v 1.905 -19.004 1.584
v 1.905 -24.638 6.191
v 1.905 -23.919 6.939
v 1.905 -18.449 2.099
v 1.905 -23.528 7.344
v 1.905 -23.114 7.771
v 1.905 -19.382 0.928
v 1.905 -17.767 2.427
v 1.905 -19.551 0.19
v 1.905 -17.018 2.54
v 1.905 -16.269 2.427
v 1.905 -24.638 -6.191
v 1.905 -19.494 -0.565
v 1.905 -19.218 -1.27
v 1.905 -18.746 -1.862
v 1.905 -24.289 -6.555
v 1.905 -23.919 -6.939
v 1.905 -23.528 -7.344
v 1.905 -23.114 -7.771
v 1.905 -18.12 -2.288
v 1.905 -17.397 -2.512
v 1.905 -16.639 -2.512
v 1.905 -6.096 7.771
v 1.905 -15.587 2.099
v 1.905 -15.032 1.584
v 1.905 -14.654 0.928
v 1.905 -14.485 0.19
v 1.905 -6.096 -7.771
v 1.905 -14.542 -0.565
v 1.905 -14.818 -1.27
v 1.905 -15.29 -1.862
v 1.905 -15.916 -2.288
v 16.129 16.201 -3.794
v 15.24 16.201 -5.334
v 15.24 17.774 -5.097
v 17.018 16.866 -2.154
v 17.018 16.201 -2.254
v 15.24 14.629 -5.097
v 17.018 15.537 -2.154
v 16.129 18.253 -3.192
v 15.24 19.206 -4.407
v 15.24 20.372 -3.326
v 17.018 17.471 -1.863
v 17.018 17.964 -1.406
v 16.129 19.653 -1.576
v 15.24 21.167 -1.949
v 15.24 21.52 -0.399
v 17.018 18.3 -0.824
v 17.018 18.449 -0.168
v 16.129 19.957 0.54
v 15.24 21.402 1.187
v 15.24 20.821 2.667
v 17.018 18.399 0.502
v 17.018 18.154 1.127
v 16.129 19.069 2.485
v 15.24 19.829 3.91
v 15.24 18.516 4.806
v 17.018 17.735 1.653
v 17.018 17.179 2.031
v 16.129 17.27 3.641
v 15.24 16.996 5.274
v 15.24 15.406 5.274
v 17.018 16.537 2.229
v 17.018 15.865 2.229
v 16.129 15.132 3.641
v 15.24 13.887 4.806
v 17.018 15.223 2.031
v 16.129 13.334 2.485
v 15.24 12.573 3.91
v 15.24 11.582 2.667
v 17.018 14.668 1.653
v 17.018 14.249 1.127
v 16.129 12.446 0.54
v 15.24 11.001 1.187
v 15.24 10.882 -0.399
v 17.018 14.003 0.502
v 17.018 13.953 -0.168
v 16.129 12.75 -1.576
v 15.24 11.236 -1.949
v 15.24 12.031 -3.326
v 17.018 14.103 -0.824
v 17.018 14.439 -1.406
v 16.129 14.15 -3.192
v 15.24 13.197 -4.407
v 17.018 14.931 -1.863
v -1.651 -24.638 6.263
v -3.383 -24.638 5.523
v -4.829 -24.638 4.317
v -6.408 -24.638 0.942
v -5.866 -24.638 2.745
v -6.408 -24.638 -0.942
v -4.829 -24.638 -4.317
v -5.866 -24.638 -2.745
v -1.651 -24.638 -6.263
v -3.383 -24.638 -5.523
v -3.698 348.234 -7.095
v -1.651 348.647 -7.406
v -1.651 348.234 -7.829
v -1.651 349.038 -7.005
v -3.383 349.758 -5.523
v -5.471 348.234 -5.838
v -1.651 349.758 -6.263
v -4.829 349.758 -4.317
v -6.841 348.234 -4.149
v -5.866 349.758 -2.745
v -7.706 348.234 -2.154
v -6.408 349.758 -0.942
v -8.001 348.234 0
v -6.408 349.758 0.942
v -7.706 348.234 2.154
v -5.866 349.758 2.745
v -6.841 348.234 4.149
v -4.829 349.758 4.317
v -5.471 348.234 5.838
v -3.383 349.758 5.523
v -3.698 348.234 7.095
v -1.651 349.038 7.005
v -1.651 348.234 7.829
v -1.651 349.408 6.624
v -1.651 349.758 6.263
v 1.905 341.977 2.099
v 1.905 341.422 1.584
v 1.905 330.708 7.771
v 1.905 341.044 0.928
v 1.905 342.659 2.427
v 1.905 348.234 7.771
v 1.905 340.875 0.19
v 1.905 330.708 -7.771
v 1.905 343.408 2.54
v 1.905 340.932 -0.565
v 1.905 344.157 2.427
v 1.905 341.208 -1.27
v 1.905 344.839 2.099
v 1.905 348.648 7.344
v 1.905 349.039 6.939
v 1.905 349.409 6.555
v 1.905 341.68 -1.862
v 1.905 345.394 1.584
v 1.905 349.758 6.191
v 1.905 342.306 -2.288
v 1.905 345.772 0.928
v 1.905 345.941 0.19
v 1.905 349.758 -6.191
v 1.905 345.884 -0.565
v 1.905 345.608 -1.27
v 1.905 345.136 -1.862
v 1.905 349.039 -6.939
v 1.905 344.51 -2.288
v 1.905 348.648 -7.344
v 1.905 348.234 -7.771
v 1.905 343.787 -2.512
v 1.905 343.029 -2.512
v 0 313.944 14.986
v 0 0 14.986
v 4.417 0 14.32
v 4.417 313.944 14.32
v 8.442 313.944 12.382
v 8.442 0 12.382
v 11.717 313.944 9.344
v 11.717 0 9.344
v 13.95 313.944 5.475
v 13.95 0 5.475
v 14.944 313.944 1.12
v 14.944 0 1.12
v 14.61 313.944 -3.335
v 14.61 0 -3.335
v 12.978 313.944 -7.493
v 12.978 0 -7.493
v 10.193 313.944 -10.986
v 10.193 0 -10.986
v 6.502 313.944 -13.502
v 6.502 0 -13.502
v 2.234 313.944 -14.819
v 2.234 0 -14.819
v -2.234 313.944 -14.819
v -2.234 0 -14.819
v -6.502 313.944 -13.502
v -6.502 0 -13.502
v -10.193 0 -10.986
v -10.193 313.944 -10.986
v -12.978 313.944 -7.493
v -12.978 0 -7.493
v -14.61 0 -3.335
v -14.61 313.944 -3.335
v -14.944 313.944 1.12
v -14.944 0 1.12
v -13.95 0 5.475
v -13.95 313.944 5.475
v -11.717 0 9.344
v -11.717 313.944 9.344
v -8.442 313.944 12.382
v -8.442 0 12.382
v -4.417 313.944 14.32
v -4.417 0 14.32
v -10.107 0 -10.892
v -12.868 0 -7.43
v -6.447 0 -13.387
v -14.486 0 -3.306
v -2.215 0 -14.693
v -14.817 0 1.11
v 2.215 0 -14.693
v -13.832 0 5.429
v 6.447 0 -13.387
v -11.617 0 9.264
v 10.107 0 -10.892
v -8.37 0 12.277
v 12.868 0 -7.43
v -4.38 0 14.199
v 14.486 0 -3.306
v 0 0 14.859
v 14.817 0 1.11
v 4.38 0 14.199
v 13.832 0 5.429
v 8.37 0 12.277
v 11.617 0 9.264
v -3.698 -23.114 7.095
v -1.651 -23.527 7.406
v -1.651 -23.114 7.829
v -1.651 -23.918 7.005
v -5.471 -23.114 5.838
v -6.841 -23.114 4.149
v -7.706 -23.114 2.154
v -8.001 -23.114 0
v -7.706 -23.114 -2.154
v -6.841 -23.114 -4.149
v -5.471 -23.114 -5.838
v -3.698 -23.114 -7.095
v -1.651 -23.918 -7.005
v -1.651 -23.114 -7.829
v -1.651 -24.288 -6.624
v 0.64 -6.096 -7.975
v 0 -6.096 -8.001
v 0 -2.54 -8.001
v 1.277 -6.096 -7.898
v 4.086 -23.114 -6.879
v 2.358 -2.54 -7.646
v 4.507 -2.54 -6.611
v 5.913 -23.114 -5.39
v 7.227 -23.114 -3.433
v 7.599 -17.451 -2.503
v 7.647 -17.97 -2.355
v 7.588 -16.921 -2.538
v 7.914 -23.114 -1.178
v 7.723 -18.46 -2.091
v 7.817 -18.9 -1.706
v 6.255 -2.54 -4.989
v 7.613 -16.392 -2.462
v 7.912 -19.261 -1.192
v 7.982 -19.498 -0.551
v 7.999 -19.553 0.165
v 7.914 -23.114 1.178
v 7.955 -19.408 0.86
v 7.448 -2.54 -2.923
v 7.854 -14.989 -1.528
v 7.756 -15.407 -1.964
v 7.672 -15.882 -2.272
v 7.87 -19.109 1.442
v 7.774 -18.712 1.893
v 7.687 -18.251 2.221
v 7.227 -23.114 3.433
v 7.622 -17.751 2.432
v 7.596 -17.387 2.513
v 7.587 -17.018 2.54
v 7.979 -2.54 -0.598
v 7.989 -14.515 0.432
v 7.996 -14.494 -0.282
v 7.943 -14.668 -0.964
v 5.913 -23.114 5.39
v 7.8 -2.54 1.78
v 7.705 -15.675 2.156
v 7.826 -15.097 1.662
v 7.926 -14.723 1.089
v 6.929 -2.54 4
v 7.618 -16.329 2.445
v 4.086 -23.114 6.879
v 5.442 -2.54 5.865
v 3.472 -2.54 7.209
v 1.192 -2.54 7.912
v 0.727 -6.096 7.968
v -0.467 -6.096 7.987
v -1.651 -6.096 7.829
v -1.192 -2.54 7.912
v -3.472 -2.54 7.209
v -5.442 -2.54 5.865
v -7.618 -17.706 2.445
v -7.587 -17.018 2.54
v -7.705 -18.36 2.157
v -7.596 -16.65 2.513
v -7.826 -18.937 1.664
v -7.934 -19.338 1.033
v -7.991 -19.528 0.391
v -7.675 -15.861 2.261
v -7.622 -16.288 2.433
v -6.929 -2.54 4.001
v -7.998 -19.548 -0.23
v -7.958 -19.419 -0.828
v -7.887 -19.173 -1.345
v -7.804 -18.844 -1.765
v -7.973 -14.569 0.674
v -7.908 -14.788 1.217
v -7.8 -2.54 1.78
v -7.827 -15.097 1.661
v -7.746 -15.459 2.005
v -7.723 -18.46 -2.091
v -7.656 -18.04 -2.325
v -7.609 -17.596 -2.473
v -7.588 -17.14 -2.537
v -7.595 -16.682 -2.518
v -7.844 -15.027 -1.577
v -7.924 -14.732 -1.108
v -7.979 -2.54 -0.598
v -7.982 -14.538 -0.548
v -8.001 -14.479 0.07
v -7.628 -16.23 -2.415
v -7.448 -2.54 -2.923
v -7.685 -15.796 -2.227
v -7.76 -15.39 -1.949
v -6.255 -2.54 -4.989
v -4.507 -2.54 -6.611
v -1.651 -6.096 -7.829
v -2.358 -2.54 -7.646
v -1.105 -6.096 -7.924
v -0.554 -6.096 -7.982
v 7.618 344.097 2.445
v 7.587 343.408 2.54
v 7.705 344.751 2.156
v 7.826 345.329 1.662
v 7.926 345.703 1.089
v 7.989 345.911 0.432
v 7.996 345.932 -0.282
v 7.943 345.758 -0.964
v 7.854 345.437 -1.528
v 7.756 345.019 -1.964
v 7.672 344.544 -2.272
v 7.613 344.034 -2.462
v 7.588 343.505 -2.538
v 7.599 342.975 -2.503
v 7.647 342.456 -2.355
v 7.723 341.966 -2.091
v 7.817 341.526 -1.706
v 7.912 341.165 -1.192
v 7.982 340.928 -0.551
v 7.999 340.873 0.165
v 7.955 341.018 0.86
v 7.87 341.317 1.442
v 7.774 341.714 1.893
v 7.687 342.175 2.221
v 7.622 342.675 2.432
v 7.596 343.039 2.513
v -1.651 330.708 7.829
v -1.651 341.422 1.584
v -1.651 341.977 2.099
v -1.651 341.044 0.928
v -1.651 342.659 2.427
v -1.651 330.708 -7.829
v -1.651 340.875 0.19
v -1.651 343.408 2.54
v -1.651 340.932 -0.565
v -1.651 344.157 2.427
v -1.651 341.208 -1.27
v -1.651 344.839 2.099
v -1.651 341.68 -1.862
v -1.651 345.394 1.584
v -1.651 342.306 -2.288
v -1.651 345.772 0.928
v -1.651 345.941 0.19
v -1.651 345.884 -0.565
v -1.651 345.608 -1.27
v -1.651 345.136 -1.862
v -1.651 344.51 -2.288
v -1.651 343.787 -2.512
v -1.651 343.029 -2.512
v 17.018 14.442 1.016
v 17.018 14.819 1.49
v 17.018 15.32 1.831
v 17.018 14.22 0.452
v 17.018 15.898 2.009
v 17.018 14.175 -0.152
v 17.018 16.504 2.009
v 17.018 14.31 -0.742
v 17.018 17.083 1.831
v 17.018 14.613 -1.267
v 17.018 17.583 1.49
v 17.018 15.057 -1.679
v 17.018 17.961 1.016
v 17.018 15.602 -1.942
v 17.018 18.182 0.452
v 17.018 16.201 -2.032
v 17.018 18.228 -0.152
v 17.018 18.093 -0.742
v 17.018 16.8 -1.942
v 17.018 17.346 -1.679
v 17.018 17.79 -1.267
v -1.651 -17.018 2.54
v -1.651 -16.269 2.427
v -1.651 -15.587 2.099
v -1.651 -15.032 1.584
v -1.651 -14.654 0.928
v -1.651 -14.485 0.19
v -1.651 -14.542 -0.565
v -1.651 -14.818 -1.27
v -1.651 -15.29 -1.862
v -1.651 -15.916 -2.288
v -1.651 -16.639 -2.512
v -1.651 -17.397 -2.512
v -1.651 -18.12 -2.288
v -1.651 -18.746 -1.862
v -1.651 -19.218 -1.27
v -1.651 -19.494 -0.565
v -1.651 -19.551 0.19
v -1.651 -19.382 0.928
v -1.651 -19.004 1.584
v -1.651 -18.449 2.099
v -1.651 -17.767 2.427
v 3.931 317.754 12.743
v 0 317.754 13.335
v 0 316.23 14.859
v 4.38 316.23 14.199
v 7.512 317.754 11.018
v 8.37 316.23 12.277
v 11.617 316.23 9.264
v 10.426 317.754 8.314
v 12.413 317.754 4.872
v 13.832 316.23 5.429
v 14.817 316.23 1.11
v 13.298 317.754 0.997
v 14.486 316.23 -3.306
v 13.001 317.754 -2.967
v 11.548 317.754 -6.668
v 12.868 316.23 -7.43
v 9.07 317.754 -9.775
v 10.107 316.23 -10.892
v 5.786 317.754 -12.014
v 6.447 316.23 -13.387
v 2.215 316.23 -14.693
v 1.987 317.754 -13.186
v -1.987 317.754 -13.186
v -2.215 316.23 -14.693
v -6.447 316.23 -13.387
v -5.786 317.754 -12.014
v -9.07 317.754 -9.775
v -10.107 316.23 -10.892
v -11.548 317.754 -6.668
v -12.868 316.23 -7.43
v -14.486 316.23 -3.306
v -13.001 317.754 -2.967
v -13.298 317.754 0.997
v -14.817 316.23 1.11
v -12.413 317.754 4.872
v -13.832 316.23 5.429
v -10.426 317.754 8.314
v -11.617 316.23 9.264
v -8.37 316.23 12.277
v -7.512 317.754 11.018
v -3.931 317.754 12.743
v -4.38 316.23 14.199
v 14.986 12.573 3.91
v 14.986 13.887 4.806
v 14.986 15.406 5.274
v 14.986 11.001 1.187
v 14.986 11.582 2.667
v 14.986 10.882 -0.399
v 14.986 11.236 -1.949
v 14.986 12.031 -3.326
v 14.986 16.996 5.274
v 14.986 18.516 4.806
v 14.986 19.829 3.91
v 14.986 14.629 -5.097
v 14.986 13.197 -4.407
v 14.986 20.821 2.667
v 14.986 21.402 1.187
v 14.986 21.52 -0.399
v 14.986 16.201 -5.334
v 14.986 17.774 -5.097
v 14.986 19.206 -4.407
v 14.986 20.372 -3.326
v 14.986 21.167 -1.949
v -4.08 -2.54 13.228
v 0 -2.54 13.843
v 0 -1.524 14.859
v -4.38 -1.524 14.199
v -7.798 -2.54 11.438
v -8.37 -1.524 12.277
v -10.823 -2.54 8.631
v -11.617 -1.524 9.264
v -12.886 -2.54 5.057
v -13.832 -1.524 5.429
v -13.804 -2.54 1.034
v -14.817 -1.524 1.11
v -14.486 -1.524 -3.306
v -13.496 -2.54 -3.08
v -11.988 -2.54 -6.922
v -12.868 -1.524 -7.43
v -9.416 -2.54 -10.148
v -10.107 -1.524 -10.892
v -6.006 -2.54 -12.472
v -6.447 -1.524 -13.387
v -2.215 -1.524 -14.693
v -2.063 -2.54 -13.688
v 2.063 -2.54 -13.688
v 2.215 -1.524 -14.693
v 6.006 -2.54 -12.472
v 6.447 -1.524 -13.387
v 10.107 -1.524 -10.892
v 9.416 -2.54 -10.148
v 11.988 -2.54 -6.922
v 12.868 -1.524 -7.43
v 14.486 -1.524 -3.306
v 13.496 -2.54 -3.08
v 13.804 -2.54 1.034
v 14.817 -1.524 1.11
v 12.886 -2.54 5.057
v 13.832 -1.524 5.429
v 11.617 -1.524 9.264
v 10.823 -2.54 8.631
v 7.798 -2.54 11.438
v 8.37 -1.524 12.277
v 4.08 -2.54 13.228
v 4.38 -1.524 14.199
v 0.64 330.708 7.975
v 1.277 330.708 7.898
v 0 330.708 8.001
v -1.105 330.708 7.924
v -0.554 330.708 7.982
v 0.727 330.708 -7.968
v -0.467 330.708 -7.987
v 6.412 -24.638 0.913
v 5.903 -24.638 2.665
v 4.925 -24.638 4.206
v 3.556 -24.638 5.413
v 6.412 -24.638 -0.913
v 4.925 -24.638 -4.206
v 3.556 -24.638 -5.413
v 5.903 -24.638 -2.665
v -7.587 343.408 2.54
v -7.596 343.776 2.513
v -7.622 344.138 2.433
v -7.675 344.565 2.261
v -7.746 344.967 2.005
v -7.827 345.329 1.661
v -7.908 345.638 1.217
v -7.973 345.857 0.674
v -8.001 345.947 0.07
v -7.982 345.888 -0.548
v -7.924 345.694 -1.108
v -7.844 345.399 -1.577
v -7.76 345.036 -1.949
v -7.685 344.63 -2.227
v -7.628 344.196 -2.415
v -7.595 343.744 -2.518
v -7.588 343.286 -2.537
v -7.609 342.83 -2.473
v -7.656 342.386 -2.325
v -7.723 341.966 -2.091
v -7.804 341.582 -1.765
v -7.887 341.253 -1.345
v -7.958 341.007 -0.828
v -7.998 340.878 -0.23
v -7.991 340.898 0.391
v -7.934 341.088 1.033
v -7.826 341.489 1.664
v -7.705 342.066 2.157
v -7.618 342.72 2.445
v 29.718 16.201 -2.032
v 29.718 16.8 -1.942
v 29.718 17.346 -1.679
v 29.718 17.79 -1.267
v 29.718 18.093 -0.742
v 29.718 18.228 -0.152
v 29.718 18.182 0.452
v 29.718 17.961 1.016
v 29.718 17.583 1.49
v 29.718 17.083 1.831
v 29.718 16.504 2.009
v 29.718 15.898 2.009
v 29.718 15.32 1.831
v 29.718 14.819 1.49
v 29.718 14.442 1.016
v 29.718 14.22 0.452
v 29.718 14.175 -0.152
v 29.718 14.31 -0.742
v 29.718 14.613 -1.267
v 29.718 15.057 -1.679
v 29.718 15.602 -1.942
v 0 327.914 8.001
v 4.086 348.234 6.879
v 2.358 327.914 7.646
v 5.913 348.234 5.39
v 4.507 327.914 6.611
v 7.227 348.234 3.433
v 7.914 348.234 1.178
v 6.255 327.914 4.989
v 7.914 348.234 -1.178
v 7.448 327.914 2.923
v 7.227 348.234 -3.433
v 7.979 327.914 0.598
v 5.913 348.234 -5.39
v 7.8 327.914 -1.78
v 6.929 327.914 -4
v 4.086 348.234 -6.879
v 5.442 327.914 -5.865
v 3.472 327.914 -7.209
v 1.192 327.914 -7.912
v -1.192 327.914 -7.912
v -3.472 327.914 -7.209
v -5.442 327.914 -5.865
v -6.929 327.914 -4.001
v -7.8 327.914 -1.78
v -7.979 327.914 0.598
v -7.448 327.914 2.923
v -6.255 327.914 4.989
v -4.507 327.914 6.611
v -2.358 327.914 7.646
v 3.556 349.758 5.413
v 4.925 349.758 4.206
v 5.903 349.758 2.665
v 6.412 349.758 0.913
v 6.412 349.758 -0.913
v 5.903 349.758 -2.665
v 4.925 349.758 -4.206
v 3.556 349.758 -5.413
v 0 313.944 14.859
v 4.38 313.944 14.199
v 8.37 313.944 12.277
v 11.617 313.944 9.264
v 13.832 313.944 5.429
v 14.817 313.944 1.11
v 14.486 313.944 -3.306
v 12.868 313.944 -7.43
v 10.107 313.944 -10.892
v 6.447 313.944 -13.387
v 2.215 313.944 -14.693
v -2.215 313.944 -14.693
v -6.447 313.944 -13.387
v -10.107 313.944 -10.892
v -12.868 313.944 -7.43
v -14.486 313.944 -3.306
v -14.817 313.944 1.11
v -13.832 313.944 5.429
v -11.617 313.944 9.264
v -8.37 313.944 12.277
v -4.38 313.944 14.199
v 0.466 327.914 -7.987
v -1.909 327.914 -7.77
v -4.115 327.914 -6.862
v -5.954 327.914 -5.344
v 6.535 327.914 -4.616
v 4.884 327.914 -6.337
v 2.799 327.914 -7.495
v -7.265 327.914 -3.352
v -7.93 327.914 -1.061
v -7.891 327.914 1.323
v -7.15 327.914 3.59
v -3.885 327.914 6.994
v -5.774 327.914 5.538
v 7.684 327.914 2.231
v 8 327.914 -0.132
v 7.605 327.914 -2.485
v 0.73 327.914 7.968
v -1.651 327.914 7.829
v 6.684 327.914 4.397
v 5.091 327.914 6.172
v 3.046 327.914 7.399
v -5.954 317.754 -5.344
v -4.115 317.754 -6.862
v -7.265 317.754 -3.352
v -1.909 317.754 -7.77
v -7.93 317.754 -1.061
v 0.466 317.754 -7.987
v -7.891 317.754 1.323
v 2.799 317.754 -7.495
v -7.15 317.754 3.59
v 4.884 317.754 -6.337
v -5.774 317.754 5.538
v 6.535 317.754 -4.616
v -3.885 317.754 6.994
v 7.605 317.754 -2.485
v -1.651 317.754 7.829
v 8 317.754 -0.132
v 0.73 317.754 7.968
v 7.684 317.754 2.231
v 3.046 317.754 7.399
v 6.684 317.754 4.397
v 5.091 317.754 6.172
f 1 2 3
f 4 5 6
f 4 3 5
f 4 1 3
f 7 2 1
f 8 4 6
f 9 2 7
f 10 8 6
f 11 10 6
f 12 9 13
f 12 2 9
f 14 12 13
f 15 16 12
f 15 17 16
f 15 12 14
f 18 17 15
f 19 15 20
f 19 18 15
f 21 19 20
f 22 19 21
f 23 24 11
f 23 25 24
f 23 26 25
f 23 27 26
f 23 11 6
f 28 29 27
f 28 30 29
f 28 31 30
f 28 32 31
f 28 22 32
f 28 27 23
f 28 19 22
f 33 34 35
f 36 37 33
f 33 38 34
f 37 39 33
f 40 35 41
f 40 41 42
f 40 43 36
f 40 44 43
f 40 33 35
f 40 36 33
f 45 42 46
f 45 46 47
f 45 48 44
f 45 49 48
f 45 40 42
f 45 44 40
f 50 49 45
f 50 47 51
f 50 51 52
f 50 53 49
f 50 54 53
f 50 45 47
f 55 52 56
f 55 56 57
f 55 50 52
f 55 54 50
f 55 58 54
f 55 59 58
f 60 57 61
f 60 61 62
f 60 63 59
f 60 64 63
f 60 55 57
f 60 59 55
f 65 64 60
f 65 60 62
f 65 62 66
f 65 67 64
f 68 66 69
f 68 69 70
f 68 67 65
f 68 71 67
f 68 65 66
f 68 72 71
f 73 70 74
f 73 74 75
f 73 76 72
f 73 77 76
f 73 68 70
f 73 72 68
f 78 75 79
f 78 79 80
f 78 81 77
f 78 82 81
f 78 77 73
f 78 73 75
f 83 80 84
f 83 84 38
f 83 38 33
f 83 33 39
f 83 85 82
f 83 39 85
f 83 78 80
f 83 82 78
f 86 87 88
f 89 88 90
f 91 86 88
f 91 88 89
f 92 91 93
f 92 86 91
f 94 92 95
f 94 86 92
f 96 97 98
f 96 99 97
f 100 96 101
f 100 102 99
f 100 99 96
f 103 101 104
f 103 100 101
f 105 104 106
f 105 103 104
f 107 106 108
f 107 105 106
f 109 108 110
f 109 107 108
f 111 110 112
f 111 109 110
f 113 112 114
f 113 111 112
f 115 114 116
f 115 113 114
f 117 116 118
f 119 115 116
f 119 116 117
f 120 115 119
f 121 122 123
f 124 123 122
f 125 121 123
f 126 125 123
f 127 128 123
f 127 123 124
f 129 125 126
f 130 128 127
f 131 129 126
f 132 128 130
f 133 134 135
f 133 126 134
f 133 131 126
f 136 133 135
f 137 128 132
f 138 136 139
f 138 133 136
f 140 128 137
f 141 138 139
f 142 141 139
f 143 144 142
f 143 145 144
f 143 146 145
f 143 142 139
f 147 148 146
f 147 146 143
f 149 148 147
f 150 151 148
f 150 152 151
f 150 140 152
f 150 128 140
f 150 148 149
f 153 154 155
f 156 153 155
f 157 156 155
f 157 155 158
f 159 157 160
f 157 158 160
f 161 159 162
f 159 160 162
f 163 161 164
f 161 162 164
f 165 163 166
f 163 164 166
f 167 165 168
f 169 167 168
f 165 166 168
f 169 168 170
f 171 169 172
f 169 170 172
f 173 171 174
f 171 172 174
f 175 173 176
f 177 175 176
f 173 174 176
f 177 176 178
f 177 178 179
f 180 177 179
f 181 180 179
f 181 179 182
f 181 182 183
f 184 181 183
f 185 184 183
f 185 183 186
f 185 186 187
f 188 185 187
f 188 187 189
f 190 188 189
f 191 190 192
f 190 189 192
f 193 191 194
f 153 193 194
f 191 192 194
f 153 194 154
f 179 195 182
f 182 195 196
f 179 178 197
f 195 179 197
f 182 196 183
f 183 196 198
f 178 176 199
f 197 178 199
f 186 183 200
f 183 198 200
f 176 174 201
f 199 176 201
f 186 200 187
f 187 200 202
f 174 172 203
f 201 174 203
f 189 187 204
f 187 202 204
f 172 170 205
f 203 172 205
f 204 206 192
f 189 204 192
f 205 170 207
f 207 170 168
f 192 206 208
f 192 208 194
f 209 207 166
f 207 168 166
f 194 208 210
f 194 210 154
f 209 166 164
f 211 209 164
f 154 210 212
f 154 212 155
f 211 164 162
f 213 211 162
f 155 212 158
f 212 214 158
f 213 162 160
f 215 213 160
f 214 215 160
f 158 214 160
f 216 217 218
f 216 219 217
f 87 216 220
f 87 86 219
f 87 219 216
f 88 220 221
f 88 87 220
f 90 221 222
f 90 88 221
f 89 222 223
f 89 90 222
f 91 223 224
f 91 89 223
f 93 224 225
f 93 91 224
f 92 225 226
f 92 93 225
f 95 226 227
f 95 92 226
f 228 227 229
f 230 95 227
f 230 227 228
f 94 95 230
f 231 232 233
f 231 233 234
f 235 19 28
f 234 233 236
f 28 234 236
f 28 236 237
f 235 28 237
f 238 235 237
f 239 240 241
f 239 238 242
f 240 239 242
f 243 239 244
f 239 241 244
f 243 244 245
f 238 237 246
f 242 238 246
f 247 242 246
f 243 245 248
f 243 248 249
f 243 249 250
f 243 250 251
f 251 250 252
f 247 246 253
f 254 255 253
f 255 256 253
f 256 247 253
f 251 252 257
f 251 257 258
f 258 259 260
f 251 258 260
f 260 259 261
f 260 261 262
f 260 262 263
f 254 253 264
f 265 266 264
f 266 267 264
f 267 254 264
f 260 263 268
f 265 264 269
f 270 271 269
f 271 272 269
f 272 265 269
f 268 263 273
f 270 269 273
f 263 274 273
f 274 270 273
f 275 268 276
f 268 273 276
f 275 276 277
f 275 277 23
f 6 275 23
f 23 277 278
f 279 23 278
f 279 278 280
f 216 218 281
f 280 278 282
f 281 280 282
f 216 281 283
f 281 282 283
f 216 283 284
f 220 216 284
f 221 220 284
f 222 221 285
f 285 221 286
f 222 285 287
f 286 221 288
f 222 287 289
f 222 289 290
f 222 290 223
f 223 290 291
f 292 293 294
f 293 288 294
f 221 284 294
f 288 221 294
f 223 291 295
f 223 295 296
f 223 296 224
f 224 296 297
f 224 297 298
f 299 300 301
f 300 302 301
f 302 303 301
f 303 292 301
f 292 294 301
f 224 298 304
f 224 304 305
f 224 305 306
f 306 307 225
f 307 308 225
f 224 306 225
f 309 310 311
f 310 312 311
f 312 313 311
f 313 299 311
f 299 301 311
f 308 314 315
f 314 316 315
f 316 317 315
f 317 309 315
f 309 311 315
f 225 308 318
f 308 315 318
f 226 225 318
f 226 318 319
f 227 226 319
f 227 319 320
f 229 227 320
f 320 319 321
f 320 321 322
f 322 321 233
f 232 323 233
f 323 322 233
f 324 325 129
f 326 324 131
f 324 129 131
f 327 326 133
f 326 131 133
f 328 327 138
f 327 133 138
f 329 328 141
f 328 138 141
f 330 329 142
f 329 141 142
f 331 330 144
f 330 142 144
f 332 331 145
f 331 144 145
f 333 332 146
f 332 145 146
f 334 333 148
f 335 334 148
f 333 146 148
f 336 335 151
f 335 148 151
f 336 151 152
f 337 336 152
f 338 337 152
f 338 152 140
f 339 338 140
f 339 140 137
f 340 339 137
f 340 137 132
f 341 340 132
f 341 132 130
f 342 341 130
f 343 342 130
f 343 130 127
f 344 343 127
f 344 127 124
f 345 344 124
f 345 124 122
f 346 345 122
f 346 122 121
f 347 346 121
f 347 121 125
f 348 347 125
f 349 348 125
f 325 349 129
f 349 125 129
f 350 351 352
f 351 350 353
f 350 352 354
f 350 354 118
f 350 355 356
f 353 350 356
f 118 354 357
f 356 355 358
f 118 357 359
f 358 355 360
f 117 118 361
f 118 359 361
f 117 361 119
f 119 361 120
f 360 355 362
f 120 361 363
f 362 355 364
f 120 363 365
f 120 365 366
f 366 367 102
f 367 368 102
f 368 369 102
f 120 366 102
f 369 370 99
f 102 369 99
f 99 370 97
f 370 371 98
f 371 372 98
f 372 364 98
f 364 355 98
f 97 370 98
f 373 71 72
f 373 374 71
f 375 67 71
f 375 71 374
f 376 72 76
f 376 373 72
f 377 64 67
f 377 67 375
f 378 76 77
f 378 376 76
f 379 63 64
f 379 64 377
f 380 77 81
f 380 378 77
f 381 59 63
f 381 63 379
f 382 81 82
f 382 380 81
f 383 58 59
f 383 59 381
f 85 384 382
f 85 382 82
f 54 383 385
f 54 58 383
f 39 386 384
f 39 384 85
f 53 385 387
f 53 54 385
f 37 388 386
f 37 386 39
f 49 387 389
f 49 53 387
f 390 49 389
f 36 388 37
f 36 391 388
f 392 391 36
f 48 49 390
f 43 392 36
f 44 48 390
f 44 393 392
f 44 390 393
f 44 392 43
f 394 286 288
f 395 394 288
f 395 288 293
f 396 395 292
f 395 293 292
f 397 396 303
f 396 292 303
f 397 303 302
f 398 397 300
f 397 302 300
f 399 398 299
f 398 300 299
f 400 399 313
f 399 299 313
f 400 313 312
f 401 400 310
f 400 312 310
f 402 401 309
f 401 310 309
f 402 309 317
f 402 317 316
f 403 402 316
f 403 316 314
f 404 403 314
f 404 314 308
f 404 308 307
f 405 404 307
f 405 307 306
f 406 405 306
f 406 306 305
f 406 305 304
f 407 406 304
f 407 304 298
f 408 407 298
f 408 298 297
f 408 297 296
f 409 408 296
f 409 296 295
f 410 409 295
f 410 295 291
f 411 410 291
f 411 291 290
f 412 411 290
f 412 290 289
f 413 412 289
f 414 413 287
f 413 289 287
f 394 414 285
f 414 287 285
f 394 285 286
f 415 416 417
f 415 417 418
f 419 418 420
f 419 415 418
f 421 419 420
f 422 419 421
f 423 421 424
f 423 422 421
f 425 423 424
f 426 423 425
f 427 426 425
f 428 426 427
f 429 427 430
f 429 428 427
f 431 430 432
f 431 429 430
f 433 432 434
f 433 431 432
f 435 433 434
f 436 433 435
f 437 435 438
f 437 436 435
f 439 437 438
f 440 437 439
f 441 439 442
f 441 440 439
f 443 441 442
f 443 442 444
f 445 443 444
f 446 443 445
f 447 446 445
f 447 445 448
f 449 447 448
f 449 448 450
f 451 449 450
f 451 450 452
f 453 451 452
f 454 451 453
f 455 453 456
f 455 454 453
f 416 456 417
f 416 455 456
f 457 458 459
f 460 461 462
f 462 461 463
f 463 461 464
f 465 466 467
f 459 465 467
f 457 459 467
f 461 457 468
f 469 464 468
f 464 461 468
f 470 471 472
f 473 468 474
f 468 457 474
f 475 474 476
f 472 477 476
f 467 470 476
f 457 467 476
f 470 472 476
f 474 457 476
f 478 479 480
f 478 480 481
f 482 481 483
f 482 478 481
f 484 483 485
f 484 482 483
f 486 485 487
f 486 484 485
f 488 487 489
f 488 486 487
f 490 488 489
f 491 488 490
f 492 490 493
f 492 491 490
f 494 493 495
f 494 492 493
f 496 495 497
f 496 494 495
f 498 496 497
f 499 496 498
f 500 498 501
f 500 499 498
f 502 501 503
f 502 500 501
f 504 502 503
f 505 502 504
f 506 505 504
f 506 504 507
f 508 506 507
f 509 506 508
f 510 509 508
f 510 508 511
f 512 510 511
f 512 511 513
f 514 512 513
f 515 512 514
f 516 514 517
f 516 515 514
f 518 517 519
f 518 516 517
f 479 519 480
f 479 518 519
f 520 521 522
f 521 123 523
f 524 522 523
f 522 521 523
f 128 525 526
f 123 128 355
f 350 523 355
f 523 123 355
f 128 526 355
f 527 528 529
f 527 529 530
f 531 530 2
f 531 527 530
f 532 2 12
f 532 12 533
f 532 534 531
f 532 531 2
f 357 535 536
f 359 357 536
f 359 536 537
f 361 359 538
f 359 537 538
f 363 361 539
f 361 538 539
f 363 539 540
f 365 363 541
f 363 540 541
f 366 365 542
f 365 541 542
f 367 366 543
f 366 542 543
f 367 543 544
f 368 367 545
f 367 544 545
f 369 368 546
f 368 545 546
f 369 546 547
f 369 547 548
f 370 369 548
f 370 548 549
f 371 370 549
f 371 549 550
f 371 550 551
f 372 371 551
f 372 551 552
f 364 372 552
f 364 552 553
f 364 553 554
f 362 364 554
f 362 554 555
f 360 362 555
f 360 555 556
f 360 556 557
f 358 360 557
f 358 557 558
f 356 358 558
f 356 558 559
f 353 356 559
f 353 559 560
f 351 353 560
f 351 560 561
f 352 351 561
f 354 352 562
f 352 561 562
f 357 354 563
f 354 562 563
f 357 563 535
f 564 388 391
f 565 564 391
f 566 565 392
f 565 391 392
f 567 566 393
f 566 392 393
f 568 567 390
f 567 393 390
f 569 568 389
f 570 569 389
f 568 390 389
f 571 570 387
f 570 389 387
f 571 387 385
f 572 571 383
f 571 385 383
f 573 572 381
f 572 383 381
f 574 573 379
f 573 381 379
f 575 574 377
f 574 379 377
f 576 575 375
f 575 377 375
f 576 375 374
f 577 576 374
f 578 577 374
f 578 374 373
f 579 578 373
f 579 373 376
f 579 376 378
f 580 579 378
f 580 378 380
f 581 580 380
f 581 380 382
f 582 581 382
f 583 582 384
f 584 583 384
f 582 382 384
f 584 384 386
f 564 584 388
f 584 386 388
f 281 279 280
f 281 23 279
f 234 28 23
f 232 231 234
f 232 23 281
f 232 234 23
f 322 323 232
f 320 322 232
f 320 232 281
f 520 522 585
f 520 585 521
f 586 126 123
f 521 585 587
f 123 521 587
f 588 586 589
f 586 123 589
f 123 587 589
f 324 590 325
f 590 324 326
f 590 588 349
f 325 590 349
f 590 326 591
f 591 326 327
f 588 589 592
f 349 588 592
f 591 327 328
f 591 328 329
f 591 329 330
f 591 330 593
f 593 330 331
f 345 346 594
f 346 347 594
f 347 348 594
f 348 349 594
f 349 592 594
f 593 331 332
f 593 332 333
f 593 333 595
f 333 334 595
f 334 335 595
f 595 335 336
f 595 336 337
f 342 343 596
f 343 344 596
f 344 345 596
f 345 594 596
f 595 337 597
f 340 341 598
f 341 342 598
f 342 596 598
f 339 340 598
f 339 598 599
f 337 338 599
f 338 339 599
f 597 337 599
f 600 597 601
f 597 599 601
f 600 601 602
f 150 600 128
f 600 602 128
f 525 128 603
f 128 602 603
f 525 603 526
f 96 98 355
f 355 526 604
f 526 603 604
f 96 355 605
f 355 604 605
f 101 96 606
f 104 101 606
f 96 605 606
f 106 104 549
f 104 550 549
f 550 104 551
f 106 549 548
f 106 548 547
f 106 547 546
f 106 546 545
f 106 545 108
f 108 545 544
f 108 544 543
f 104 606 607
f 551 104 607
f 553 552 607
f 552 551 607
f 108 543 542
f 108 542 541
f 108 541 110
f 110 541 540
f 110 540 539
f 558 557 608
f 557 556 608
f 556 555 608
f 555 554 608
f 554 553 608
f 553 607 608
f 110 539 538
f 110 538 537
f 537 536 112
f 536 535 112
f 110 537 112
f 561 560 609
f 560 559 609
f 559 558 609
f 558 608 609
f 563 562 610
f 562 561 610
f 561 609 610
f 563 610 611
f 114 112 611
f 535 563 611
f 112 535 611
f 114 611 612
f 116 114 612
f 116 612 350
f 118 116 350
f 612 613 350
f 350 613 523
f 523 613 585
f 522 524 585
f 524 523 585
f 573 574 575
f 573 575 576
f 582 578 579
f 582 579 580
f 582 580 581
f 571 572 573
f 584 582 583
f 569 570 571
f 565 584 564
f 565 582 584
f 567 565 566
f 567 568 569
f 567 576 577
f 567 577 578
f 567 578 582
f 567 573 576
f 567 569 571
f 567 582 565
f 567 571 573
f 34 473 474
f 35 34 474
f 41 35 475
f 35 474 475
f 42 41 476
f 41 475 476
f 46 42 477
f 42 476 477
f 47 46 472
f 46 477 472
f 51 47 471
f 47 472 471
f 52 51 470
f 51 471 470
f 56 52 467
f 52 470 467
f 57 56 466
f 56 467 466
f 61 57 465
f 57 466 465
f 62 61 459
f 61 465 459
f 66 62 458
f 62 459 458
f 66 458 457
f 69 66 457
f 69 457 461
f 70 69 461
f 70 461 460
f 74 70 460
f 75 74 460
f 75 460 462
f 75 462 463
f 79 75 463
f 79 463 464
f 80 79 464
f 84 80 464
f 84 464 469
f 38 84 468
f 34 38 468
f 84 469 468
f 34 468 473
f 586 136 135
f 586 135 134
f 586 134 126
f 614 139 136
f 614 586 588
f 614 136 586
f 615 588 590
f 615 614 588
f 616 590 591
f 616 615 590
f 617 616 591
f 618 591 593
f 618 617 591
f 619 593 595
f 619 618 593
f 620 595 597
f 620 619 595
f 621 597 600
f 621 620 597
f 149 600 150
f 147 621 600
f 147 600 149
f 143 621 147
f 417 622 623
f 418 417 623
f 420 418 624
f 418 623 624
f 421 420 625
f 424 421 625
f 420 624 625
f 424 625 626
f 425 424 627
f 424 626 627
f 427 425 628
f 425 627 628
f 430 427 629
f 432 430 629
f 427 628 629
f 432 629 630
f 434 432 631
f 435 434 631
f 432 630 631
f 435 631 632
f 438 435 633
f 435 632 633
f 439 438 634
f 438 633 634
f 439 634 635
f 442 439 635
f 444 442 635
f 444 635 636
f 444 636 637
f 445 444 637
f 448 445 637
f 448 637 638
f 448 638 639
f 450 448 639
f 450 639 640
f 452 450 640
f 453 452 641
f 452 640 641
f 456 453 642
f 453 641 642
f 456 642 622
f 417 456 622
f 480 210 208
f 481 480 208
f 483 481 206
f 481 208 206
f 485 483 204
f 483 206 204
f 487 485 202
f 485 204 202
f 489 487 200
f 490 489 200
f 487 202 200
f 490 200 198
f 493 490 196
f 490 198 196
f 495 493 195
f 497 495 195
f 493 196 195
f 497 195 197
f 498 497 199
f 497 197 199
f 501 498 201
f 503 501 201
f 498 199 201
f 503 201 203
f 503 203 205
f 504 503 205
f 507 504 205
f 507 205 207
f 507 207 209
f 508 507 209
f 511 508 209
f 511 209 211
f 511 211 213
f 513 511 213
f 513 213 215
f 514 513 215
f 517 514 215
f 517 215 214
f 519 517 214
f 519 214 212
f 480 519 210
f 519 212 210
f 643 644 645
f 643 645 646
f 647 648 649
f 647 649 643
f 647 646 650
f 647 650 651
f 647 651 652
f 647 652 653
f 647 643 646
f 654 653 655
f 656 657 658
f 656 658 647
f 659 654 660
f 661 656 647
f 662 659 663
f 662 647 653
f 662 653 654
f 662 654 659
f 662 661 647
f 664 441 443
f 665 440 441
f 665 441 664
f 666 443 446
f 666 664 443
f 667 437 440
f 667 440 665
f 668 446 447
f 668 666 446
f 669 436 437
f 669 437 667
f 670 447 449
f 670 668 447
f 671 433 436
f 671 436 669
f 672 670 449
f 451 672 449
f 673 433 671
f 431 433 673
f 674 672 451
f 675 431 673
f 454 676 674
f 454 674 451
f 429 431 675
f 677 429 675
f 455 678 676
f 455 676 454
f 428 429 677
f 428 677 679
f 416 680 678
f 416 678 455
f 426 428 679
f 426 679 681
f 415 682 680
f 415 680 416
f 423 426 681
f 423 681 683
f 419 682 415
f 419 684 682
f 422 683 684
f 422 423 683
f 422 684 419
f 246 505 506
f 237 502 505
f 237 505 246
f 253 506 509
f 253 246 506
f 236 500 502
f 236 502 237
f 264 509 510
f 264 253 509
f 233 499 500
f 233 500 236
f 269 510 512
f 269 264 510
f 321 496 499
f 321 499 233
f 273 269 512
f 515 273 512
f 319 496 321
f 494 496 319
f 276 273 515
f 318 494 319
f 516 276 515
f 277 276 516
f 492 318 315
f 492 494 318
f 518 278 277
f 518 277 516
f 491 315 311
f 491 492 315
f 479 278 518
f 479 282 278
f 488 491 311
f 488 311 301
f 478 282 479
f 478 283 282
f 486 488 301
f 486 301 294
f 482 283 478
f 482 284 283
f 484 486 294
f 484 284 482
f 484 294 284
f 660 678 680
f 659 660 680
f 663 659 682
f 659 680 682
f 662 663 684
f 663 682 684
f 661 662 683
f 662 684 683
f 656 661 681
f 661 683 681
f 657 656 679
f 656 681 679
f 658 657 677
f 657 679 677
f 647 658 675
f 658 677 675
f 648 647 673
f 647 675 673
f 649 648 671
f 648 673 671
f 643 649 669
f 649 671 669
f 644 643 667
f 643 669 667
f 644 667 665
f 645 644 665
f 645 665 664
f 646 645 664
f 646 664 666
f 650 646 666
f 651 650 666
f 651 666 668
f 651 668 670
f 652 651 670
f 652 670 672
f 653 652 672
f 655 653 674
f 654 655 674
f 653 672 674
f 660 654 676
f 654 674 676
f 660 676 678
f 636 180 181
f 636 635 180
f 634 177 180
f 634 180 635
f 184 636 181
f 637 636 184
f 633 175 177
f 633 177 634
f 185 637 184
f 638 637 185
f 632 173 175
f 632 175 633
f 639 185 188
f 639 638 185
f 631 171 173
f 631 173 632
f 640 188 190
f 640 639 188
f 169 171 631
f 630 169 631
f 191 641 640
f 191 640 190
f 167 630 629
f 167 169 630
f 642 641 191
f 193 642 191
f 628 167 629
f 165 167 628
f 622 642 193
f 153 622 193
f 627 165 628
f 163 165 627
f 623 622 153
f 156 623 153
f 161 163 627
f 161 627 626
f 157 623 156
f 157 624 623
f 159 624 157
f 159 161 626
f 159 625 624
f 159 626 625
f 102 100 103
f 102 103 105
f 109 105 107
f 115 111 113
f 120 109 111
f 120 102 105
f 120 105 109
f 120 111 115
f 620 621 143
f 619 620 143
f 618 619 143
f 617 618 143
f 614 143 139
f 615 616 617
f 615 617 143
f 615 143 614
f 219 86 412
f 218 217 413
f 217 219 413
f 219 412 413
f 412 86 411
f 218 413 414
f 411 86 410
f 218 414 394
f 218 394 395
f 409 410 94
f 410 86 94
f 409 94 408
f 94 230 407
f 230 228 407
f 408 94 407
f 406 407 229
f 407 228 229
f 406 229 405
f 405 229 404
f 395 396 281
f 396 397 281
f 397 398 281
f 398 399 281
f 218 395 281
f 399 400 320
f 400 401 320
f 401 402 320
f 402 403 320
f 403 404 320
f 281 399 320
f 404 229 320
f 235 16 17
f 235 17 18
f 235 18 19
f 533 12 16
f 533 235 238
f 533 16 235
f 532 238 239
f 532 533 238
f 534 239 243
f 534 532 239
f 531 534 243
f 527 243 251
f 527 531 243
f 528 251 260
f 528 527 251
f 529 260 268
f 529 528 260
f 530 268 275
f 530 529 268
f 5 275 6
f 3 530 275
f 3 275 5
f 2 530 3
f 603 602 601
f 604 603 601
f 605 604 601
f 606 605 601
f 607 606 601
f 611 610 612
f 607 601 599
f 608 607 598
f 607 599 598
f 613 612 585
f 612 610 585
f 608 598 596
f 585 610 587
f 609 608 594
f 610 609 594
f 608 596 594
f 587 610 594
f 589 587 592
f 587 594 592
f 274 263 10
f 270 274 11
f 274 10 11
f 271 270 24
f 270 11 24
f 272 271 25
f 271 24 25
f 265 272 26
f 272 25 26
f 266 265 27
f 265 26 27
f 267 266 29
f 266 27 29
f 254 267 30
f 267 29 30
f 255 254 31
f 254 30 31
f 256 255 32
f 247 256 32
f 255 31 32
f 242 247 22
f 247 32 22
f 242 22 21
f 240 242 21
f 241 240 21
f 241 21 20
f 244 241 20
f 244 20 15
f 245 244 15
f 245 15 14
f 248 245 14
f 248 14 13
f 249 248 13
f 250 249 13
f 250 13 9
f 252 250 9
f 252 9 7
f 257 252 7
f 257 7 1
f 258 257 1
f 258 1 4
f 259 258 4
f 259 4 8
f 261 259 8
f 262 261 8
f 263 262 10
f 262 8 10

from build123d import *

# Parameters (mm, degrees)
SKETCH1_R           = 14.986
BOSS_EXTRUDE1_DEPTH = 313.944
SKETCH2_R           = 14.859
BOSS_EXTRUDE2_DEPTH = 2.54
CHAMFER1_SIZE       = 1.016
SKETCH3_R           = 8.001
BOSS_EXTRUDE3_DEPTH = 22.098
CHAMFER2_SIZE       = 1.524
SKETCH4_R           = 2.54
CUT_EXTRUDE1_DEPTH  = 21.59
SKETCH5_W           = 3.556
SKETCH5_H           = 22.881169146
CUT_EXTRUDE2_DEPTH  = 21.59
SKETCH6_R           = 5.334
BOSS_EXTRUDE4_DEPTH = 2.032
CHAMFER3_SIZE       = 1.778
CHAMFER3_SIZE2      = 3.079586336
SKETCH7_R           = 2.032
BOSS_EXTRUDE5_DEPTH = 12.7
SKETCH8_R           = 14.859
BOSS_EXTRUDE6_DEPTH = 3.81
CHAMFER4_SIZE       = 1.524
SKETCH9_R           = 8.001
BOSS_EXTRUDE7_DEPTH = 10.16
SKETCH10_R          = 8.001
BOSS_EXTRUDE8_DEPTH = 21.844
CHAMFER5_SIZE       = 1.524
SKETCH11_R          = 2.54
CUT_EXTRUDE3_DEPTH  = 21.844
SKETCH12_W          = 3.556
SKETCH12_H          = 19.05
CUT_EXTRUDE4_DEPTH  = 21.844


with BuildPart() as part:
    # Sketch1 → Boss-Extrude1 (new body)
    with BuildSketch(Plane(origin=(0, 0, 0), x_dir=(1, 0, 0), z_dir=(0, 1, 0))):
        with Locations(Location((0, 0, 0), (0, 0, 270))):  # turned: the seam where the file's is
            Circle(SKETCH1_R)
    extrude(amount=BOSS_EXTRUDE1_DEPTH)

    # Sketch2 → Boss-Extrude2 (add)
    with BuildSketch(Plane.XZ):
        with Locations(Location((0, 0, 0), (0, 0, 90))):  # turned: the seam where the file's is
            Circle(SKETCH2_R)
    extrude(amount=BOSS_EXTRUDE2_DEPTH)

    # Chamfer1
    chamfer1_edges = [part.edges().sort_by_distance(p)[0] for p in [
        (0, -2.54, -14.859),
    ]]
    chamfer(chamfer1_edges, length=CHAMFER1_SIZE)

    # Sketch3 → Boss-Extrude3 (add)
    with BuildSketch(Plane.XZ.offset(2.54)):
        with Locations(Location((0, 0, 0), (0, 0, 270))):  # turned: the seam where the file's is
            Circle(SKETCH3_R)
    extrude(amount=BOSS_EXTRUDE3_DEPTH)

    # Chamfer2
    chamfer2_edges = [part.edges().sort_by_distance(p)[0] for p in [
        (0, -24.638, 8.001),
    ]]
    chamfer(chamfer2_edges, length=CHAMFER2_SIZE)

    # Sketch4 → Cut-Extrude1 (cut)
    with BuildSketch(Plane.ZY.offset(8.001)):
        with Locations((0, -17.018)):
            Circle(SKETCH4_R)
    extrude(amount=-CUT_EXTRUDE1_DEPTH, mode=Mode.SUBTRACT)

    # Sketch5 → Cut-Extrude2 (cut)
    with BuildSketch(Plane(origin=(0, 0, -8.001), x_dir=(-1, 0, 0), z_dir=(0, 0, -1))):
        with Locations((-0.127, -17.536584573)):
            Rectangle(SKETCH5_W, SKETCH5_H)
    extrude(amount=-CUT_EXTRUDE2_DEPTH, mode=Mode.SUBTRACT)

    # Sketch8 → Boss-Extrude6 (add)
    with BuildSketch(Plane(origin=(0, 313.944, 0), x_dir=(1, 0, 0), z_dir=(0, 1, 0))):
        with Locations(Location((0, 0, 0), (0, 0, 270))):  # turned: the seam where the file's is
            Circle(SKETCH8_R)
    extrude(amount=BOSS_EXTRUDE6_DEPTH)

    # Chamfer4
    chamfer4_edges = [part.edges().sort_by_distance(p)[0] for p in [
        (0, 317.754, -14.859),
    ]]
    chamfer(chamfer4_edges, length=CHAMFER4_SIZE)

    # Sketch9 → Boss-Extrude7 (add)
    with BuildSketch(Plane(origin=(0, 317.754, 0), x_dir=(1, 0, 0), z_dir=(0, 1, 0))):
        with Locations(Location((0, 0, 0), (0, 0, 258.091508286))):  # turned: the seam where the file's is
            Circle(SKETCH9_R)
    extrude(amount=BOSS_EXTRUDE7_DEPTH)


with BuildPart() as body_2:
    # Sketch6 → Boss-Extrude4 (new body)
    with BuildSketch(Plane(origin=(14.986, 0, 0), x_dir=(0, 0, -1), z_dir=(1, 0, 0))):
        with Locations((0, 16.201300922)):
            Circle(SKETCH6_R)
    extrude(amount=BOSS_EXTRUDE4_DEPTH)

    # Chamfer3
    chamfer3_edges = [body_2.edges().sort_by_distance(p)[0] for p in [
        (17.018, 16.201300922, 5.334),
    ]]
    chamfer3_side = [body_2.faces().sort_by_distance(p)[0] for p in [
        (16.002, 16.201300922, 5.334),
    ]]
    chamfer(chamfer3_edges, length=CHAMFER3_SIZE, length2=CHAMFER3_SIZE2, reference=chamfer3_side[0])

    # Sketch7 → Boss-Extrude5 (add)
    with BuildSketch(Plane(origin=(17.018, 0, 0), x_dir=(0, 0, -1), z_dir=(1, 0, 0))):
        with Locations((0, 16.201300922)):
            Circle(SKETCH7_R)
    extrude(amount=BOSS_EXTRUDE5_DEPTH)


with BuildPart() as body_3:
    # Sketch10 → Boss-Extrude8 (new body)
    with BuildSketch(Plane(origin=(0, 327.914, 0), x_dir=(1, 0, 0), z_dir=(0, 1, 0))):
        with Locations(Location((0, 0, 0), (0, 0, 270))):  # turned: the seam where the file's is
            Circle(SKETCH10_R)
    extrude(amount=BOSS_EXTRUDE8_DEPTH)

    # Chamfer5
    chamfer5_edges = [body_3.edges().sort_by_distance(p)[0] for p in [
        (0, 349.758, -8.001),
    ]]
    chamfer(chamfer5_edges, length=CHAMFER5_SIZE)

    # Sketch11 → Cut-Extrude3 (cut)
    with BuildSketch(Plane.ZY.offset(8.001)):
        with Locations((0, 343.408)):
            Circle(SKETCH11_R)
    extrude(amount=-CUT_EXTRUDE3_DEPTH, mode=Mode.SUBTRACT)

    # Sketch12 → Cut-Extrude4 (cut)
    with BuildSketch(Plane(origin=(0, 0, -8.001), x_dir=(-1, 0, 0), z_dir=(0, 0, -1))):
        with Locations((-0.127, 340.233)):
            Rectangle(SKETCH12_W, SKETCH12_H)
    extrude(amount=-CUT_EXTRUDE4_DEPTH, mode=Mode.SUBTRACT)


solid = Compound([part.part, body_2.part, body_3.part])
